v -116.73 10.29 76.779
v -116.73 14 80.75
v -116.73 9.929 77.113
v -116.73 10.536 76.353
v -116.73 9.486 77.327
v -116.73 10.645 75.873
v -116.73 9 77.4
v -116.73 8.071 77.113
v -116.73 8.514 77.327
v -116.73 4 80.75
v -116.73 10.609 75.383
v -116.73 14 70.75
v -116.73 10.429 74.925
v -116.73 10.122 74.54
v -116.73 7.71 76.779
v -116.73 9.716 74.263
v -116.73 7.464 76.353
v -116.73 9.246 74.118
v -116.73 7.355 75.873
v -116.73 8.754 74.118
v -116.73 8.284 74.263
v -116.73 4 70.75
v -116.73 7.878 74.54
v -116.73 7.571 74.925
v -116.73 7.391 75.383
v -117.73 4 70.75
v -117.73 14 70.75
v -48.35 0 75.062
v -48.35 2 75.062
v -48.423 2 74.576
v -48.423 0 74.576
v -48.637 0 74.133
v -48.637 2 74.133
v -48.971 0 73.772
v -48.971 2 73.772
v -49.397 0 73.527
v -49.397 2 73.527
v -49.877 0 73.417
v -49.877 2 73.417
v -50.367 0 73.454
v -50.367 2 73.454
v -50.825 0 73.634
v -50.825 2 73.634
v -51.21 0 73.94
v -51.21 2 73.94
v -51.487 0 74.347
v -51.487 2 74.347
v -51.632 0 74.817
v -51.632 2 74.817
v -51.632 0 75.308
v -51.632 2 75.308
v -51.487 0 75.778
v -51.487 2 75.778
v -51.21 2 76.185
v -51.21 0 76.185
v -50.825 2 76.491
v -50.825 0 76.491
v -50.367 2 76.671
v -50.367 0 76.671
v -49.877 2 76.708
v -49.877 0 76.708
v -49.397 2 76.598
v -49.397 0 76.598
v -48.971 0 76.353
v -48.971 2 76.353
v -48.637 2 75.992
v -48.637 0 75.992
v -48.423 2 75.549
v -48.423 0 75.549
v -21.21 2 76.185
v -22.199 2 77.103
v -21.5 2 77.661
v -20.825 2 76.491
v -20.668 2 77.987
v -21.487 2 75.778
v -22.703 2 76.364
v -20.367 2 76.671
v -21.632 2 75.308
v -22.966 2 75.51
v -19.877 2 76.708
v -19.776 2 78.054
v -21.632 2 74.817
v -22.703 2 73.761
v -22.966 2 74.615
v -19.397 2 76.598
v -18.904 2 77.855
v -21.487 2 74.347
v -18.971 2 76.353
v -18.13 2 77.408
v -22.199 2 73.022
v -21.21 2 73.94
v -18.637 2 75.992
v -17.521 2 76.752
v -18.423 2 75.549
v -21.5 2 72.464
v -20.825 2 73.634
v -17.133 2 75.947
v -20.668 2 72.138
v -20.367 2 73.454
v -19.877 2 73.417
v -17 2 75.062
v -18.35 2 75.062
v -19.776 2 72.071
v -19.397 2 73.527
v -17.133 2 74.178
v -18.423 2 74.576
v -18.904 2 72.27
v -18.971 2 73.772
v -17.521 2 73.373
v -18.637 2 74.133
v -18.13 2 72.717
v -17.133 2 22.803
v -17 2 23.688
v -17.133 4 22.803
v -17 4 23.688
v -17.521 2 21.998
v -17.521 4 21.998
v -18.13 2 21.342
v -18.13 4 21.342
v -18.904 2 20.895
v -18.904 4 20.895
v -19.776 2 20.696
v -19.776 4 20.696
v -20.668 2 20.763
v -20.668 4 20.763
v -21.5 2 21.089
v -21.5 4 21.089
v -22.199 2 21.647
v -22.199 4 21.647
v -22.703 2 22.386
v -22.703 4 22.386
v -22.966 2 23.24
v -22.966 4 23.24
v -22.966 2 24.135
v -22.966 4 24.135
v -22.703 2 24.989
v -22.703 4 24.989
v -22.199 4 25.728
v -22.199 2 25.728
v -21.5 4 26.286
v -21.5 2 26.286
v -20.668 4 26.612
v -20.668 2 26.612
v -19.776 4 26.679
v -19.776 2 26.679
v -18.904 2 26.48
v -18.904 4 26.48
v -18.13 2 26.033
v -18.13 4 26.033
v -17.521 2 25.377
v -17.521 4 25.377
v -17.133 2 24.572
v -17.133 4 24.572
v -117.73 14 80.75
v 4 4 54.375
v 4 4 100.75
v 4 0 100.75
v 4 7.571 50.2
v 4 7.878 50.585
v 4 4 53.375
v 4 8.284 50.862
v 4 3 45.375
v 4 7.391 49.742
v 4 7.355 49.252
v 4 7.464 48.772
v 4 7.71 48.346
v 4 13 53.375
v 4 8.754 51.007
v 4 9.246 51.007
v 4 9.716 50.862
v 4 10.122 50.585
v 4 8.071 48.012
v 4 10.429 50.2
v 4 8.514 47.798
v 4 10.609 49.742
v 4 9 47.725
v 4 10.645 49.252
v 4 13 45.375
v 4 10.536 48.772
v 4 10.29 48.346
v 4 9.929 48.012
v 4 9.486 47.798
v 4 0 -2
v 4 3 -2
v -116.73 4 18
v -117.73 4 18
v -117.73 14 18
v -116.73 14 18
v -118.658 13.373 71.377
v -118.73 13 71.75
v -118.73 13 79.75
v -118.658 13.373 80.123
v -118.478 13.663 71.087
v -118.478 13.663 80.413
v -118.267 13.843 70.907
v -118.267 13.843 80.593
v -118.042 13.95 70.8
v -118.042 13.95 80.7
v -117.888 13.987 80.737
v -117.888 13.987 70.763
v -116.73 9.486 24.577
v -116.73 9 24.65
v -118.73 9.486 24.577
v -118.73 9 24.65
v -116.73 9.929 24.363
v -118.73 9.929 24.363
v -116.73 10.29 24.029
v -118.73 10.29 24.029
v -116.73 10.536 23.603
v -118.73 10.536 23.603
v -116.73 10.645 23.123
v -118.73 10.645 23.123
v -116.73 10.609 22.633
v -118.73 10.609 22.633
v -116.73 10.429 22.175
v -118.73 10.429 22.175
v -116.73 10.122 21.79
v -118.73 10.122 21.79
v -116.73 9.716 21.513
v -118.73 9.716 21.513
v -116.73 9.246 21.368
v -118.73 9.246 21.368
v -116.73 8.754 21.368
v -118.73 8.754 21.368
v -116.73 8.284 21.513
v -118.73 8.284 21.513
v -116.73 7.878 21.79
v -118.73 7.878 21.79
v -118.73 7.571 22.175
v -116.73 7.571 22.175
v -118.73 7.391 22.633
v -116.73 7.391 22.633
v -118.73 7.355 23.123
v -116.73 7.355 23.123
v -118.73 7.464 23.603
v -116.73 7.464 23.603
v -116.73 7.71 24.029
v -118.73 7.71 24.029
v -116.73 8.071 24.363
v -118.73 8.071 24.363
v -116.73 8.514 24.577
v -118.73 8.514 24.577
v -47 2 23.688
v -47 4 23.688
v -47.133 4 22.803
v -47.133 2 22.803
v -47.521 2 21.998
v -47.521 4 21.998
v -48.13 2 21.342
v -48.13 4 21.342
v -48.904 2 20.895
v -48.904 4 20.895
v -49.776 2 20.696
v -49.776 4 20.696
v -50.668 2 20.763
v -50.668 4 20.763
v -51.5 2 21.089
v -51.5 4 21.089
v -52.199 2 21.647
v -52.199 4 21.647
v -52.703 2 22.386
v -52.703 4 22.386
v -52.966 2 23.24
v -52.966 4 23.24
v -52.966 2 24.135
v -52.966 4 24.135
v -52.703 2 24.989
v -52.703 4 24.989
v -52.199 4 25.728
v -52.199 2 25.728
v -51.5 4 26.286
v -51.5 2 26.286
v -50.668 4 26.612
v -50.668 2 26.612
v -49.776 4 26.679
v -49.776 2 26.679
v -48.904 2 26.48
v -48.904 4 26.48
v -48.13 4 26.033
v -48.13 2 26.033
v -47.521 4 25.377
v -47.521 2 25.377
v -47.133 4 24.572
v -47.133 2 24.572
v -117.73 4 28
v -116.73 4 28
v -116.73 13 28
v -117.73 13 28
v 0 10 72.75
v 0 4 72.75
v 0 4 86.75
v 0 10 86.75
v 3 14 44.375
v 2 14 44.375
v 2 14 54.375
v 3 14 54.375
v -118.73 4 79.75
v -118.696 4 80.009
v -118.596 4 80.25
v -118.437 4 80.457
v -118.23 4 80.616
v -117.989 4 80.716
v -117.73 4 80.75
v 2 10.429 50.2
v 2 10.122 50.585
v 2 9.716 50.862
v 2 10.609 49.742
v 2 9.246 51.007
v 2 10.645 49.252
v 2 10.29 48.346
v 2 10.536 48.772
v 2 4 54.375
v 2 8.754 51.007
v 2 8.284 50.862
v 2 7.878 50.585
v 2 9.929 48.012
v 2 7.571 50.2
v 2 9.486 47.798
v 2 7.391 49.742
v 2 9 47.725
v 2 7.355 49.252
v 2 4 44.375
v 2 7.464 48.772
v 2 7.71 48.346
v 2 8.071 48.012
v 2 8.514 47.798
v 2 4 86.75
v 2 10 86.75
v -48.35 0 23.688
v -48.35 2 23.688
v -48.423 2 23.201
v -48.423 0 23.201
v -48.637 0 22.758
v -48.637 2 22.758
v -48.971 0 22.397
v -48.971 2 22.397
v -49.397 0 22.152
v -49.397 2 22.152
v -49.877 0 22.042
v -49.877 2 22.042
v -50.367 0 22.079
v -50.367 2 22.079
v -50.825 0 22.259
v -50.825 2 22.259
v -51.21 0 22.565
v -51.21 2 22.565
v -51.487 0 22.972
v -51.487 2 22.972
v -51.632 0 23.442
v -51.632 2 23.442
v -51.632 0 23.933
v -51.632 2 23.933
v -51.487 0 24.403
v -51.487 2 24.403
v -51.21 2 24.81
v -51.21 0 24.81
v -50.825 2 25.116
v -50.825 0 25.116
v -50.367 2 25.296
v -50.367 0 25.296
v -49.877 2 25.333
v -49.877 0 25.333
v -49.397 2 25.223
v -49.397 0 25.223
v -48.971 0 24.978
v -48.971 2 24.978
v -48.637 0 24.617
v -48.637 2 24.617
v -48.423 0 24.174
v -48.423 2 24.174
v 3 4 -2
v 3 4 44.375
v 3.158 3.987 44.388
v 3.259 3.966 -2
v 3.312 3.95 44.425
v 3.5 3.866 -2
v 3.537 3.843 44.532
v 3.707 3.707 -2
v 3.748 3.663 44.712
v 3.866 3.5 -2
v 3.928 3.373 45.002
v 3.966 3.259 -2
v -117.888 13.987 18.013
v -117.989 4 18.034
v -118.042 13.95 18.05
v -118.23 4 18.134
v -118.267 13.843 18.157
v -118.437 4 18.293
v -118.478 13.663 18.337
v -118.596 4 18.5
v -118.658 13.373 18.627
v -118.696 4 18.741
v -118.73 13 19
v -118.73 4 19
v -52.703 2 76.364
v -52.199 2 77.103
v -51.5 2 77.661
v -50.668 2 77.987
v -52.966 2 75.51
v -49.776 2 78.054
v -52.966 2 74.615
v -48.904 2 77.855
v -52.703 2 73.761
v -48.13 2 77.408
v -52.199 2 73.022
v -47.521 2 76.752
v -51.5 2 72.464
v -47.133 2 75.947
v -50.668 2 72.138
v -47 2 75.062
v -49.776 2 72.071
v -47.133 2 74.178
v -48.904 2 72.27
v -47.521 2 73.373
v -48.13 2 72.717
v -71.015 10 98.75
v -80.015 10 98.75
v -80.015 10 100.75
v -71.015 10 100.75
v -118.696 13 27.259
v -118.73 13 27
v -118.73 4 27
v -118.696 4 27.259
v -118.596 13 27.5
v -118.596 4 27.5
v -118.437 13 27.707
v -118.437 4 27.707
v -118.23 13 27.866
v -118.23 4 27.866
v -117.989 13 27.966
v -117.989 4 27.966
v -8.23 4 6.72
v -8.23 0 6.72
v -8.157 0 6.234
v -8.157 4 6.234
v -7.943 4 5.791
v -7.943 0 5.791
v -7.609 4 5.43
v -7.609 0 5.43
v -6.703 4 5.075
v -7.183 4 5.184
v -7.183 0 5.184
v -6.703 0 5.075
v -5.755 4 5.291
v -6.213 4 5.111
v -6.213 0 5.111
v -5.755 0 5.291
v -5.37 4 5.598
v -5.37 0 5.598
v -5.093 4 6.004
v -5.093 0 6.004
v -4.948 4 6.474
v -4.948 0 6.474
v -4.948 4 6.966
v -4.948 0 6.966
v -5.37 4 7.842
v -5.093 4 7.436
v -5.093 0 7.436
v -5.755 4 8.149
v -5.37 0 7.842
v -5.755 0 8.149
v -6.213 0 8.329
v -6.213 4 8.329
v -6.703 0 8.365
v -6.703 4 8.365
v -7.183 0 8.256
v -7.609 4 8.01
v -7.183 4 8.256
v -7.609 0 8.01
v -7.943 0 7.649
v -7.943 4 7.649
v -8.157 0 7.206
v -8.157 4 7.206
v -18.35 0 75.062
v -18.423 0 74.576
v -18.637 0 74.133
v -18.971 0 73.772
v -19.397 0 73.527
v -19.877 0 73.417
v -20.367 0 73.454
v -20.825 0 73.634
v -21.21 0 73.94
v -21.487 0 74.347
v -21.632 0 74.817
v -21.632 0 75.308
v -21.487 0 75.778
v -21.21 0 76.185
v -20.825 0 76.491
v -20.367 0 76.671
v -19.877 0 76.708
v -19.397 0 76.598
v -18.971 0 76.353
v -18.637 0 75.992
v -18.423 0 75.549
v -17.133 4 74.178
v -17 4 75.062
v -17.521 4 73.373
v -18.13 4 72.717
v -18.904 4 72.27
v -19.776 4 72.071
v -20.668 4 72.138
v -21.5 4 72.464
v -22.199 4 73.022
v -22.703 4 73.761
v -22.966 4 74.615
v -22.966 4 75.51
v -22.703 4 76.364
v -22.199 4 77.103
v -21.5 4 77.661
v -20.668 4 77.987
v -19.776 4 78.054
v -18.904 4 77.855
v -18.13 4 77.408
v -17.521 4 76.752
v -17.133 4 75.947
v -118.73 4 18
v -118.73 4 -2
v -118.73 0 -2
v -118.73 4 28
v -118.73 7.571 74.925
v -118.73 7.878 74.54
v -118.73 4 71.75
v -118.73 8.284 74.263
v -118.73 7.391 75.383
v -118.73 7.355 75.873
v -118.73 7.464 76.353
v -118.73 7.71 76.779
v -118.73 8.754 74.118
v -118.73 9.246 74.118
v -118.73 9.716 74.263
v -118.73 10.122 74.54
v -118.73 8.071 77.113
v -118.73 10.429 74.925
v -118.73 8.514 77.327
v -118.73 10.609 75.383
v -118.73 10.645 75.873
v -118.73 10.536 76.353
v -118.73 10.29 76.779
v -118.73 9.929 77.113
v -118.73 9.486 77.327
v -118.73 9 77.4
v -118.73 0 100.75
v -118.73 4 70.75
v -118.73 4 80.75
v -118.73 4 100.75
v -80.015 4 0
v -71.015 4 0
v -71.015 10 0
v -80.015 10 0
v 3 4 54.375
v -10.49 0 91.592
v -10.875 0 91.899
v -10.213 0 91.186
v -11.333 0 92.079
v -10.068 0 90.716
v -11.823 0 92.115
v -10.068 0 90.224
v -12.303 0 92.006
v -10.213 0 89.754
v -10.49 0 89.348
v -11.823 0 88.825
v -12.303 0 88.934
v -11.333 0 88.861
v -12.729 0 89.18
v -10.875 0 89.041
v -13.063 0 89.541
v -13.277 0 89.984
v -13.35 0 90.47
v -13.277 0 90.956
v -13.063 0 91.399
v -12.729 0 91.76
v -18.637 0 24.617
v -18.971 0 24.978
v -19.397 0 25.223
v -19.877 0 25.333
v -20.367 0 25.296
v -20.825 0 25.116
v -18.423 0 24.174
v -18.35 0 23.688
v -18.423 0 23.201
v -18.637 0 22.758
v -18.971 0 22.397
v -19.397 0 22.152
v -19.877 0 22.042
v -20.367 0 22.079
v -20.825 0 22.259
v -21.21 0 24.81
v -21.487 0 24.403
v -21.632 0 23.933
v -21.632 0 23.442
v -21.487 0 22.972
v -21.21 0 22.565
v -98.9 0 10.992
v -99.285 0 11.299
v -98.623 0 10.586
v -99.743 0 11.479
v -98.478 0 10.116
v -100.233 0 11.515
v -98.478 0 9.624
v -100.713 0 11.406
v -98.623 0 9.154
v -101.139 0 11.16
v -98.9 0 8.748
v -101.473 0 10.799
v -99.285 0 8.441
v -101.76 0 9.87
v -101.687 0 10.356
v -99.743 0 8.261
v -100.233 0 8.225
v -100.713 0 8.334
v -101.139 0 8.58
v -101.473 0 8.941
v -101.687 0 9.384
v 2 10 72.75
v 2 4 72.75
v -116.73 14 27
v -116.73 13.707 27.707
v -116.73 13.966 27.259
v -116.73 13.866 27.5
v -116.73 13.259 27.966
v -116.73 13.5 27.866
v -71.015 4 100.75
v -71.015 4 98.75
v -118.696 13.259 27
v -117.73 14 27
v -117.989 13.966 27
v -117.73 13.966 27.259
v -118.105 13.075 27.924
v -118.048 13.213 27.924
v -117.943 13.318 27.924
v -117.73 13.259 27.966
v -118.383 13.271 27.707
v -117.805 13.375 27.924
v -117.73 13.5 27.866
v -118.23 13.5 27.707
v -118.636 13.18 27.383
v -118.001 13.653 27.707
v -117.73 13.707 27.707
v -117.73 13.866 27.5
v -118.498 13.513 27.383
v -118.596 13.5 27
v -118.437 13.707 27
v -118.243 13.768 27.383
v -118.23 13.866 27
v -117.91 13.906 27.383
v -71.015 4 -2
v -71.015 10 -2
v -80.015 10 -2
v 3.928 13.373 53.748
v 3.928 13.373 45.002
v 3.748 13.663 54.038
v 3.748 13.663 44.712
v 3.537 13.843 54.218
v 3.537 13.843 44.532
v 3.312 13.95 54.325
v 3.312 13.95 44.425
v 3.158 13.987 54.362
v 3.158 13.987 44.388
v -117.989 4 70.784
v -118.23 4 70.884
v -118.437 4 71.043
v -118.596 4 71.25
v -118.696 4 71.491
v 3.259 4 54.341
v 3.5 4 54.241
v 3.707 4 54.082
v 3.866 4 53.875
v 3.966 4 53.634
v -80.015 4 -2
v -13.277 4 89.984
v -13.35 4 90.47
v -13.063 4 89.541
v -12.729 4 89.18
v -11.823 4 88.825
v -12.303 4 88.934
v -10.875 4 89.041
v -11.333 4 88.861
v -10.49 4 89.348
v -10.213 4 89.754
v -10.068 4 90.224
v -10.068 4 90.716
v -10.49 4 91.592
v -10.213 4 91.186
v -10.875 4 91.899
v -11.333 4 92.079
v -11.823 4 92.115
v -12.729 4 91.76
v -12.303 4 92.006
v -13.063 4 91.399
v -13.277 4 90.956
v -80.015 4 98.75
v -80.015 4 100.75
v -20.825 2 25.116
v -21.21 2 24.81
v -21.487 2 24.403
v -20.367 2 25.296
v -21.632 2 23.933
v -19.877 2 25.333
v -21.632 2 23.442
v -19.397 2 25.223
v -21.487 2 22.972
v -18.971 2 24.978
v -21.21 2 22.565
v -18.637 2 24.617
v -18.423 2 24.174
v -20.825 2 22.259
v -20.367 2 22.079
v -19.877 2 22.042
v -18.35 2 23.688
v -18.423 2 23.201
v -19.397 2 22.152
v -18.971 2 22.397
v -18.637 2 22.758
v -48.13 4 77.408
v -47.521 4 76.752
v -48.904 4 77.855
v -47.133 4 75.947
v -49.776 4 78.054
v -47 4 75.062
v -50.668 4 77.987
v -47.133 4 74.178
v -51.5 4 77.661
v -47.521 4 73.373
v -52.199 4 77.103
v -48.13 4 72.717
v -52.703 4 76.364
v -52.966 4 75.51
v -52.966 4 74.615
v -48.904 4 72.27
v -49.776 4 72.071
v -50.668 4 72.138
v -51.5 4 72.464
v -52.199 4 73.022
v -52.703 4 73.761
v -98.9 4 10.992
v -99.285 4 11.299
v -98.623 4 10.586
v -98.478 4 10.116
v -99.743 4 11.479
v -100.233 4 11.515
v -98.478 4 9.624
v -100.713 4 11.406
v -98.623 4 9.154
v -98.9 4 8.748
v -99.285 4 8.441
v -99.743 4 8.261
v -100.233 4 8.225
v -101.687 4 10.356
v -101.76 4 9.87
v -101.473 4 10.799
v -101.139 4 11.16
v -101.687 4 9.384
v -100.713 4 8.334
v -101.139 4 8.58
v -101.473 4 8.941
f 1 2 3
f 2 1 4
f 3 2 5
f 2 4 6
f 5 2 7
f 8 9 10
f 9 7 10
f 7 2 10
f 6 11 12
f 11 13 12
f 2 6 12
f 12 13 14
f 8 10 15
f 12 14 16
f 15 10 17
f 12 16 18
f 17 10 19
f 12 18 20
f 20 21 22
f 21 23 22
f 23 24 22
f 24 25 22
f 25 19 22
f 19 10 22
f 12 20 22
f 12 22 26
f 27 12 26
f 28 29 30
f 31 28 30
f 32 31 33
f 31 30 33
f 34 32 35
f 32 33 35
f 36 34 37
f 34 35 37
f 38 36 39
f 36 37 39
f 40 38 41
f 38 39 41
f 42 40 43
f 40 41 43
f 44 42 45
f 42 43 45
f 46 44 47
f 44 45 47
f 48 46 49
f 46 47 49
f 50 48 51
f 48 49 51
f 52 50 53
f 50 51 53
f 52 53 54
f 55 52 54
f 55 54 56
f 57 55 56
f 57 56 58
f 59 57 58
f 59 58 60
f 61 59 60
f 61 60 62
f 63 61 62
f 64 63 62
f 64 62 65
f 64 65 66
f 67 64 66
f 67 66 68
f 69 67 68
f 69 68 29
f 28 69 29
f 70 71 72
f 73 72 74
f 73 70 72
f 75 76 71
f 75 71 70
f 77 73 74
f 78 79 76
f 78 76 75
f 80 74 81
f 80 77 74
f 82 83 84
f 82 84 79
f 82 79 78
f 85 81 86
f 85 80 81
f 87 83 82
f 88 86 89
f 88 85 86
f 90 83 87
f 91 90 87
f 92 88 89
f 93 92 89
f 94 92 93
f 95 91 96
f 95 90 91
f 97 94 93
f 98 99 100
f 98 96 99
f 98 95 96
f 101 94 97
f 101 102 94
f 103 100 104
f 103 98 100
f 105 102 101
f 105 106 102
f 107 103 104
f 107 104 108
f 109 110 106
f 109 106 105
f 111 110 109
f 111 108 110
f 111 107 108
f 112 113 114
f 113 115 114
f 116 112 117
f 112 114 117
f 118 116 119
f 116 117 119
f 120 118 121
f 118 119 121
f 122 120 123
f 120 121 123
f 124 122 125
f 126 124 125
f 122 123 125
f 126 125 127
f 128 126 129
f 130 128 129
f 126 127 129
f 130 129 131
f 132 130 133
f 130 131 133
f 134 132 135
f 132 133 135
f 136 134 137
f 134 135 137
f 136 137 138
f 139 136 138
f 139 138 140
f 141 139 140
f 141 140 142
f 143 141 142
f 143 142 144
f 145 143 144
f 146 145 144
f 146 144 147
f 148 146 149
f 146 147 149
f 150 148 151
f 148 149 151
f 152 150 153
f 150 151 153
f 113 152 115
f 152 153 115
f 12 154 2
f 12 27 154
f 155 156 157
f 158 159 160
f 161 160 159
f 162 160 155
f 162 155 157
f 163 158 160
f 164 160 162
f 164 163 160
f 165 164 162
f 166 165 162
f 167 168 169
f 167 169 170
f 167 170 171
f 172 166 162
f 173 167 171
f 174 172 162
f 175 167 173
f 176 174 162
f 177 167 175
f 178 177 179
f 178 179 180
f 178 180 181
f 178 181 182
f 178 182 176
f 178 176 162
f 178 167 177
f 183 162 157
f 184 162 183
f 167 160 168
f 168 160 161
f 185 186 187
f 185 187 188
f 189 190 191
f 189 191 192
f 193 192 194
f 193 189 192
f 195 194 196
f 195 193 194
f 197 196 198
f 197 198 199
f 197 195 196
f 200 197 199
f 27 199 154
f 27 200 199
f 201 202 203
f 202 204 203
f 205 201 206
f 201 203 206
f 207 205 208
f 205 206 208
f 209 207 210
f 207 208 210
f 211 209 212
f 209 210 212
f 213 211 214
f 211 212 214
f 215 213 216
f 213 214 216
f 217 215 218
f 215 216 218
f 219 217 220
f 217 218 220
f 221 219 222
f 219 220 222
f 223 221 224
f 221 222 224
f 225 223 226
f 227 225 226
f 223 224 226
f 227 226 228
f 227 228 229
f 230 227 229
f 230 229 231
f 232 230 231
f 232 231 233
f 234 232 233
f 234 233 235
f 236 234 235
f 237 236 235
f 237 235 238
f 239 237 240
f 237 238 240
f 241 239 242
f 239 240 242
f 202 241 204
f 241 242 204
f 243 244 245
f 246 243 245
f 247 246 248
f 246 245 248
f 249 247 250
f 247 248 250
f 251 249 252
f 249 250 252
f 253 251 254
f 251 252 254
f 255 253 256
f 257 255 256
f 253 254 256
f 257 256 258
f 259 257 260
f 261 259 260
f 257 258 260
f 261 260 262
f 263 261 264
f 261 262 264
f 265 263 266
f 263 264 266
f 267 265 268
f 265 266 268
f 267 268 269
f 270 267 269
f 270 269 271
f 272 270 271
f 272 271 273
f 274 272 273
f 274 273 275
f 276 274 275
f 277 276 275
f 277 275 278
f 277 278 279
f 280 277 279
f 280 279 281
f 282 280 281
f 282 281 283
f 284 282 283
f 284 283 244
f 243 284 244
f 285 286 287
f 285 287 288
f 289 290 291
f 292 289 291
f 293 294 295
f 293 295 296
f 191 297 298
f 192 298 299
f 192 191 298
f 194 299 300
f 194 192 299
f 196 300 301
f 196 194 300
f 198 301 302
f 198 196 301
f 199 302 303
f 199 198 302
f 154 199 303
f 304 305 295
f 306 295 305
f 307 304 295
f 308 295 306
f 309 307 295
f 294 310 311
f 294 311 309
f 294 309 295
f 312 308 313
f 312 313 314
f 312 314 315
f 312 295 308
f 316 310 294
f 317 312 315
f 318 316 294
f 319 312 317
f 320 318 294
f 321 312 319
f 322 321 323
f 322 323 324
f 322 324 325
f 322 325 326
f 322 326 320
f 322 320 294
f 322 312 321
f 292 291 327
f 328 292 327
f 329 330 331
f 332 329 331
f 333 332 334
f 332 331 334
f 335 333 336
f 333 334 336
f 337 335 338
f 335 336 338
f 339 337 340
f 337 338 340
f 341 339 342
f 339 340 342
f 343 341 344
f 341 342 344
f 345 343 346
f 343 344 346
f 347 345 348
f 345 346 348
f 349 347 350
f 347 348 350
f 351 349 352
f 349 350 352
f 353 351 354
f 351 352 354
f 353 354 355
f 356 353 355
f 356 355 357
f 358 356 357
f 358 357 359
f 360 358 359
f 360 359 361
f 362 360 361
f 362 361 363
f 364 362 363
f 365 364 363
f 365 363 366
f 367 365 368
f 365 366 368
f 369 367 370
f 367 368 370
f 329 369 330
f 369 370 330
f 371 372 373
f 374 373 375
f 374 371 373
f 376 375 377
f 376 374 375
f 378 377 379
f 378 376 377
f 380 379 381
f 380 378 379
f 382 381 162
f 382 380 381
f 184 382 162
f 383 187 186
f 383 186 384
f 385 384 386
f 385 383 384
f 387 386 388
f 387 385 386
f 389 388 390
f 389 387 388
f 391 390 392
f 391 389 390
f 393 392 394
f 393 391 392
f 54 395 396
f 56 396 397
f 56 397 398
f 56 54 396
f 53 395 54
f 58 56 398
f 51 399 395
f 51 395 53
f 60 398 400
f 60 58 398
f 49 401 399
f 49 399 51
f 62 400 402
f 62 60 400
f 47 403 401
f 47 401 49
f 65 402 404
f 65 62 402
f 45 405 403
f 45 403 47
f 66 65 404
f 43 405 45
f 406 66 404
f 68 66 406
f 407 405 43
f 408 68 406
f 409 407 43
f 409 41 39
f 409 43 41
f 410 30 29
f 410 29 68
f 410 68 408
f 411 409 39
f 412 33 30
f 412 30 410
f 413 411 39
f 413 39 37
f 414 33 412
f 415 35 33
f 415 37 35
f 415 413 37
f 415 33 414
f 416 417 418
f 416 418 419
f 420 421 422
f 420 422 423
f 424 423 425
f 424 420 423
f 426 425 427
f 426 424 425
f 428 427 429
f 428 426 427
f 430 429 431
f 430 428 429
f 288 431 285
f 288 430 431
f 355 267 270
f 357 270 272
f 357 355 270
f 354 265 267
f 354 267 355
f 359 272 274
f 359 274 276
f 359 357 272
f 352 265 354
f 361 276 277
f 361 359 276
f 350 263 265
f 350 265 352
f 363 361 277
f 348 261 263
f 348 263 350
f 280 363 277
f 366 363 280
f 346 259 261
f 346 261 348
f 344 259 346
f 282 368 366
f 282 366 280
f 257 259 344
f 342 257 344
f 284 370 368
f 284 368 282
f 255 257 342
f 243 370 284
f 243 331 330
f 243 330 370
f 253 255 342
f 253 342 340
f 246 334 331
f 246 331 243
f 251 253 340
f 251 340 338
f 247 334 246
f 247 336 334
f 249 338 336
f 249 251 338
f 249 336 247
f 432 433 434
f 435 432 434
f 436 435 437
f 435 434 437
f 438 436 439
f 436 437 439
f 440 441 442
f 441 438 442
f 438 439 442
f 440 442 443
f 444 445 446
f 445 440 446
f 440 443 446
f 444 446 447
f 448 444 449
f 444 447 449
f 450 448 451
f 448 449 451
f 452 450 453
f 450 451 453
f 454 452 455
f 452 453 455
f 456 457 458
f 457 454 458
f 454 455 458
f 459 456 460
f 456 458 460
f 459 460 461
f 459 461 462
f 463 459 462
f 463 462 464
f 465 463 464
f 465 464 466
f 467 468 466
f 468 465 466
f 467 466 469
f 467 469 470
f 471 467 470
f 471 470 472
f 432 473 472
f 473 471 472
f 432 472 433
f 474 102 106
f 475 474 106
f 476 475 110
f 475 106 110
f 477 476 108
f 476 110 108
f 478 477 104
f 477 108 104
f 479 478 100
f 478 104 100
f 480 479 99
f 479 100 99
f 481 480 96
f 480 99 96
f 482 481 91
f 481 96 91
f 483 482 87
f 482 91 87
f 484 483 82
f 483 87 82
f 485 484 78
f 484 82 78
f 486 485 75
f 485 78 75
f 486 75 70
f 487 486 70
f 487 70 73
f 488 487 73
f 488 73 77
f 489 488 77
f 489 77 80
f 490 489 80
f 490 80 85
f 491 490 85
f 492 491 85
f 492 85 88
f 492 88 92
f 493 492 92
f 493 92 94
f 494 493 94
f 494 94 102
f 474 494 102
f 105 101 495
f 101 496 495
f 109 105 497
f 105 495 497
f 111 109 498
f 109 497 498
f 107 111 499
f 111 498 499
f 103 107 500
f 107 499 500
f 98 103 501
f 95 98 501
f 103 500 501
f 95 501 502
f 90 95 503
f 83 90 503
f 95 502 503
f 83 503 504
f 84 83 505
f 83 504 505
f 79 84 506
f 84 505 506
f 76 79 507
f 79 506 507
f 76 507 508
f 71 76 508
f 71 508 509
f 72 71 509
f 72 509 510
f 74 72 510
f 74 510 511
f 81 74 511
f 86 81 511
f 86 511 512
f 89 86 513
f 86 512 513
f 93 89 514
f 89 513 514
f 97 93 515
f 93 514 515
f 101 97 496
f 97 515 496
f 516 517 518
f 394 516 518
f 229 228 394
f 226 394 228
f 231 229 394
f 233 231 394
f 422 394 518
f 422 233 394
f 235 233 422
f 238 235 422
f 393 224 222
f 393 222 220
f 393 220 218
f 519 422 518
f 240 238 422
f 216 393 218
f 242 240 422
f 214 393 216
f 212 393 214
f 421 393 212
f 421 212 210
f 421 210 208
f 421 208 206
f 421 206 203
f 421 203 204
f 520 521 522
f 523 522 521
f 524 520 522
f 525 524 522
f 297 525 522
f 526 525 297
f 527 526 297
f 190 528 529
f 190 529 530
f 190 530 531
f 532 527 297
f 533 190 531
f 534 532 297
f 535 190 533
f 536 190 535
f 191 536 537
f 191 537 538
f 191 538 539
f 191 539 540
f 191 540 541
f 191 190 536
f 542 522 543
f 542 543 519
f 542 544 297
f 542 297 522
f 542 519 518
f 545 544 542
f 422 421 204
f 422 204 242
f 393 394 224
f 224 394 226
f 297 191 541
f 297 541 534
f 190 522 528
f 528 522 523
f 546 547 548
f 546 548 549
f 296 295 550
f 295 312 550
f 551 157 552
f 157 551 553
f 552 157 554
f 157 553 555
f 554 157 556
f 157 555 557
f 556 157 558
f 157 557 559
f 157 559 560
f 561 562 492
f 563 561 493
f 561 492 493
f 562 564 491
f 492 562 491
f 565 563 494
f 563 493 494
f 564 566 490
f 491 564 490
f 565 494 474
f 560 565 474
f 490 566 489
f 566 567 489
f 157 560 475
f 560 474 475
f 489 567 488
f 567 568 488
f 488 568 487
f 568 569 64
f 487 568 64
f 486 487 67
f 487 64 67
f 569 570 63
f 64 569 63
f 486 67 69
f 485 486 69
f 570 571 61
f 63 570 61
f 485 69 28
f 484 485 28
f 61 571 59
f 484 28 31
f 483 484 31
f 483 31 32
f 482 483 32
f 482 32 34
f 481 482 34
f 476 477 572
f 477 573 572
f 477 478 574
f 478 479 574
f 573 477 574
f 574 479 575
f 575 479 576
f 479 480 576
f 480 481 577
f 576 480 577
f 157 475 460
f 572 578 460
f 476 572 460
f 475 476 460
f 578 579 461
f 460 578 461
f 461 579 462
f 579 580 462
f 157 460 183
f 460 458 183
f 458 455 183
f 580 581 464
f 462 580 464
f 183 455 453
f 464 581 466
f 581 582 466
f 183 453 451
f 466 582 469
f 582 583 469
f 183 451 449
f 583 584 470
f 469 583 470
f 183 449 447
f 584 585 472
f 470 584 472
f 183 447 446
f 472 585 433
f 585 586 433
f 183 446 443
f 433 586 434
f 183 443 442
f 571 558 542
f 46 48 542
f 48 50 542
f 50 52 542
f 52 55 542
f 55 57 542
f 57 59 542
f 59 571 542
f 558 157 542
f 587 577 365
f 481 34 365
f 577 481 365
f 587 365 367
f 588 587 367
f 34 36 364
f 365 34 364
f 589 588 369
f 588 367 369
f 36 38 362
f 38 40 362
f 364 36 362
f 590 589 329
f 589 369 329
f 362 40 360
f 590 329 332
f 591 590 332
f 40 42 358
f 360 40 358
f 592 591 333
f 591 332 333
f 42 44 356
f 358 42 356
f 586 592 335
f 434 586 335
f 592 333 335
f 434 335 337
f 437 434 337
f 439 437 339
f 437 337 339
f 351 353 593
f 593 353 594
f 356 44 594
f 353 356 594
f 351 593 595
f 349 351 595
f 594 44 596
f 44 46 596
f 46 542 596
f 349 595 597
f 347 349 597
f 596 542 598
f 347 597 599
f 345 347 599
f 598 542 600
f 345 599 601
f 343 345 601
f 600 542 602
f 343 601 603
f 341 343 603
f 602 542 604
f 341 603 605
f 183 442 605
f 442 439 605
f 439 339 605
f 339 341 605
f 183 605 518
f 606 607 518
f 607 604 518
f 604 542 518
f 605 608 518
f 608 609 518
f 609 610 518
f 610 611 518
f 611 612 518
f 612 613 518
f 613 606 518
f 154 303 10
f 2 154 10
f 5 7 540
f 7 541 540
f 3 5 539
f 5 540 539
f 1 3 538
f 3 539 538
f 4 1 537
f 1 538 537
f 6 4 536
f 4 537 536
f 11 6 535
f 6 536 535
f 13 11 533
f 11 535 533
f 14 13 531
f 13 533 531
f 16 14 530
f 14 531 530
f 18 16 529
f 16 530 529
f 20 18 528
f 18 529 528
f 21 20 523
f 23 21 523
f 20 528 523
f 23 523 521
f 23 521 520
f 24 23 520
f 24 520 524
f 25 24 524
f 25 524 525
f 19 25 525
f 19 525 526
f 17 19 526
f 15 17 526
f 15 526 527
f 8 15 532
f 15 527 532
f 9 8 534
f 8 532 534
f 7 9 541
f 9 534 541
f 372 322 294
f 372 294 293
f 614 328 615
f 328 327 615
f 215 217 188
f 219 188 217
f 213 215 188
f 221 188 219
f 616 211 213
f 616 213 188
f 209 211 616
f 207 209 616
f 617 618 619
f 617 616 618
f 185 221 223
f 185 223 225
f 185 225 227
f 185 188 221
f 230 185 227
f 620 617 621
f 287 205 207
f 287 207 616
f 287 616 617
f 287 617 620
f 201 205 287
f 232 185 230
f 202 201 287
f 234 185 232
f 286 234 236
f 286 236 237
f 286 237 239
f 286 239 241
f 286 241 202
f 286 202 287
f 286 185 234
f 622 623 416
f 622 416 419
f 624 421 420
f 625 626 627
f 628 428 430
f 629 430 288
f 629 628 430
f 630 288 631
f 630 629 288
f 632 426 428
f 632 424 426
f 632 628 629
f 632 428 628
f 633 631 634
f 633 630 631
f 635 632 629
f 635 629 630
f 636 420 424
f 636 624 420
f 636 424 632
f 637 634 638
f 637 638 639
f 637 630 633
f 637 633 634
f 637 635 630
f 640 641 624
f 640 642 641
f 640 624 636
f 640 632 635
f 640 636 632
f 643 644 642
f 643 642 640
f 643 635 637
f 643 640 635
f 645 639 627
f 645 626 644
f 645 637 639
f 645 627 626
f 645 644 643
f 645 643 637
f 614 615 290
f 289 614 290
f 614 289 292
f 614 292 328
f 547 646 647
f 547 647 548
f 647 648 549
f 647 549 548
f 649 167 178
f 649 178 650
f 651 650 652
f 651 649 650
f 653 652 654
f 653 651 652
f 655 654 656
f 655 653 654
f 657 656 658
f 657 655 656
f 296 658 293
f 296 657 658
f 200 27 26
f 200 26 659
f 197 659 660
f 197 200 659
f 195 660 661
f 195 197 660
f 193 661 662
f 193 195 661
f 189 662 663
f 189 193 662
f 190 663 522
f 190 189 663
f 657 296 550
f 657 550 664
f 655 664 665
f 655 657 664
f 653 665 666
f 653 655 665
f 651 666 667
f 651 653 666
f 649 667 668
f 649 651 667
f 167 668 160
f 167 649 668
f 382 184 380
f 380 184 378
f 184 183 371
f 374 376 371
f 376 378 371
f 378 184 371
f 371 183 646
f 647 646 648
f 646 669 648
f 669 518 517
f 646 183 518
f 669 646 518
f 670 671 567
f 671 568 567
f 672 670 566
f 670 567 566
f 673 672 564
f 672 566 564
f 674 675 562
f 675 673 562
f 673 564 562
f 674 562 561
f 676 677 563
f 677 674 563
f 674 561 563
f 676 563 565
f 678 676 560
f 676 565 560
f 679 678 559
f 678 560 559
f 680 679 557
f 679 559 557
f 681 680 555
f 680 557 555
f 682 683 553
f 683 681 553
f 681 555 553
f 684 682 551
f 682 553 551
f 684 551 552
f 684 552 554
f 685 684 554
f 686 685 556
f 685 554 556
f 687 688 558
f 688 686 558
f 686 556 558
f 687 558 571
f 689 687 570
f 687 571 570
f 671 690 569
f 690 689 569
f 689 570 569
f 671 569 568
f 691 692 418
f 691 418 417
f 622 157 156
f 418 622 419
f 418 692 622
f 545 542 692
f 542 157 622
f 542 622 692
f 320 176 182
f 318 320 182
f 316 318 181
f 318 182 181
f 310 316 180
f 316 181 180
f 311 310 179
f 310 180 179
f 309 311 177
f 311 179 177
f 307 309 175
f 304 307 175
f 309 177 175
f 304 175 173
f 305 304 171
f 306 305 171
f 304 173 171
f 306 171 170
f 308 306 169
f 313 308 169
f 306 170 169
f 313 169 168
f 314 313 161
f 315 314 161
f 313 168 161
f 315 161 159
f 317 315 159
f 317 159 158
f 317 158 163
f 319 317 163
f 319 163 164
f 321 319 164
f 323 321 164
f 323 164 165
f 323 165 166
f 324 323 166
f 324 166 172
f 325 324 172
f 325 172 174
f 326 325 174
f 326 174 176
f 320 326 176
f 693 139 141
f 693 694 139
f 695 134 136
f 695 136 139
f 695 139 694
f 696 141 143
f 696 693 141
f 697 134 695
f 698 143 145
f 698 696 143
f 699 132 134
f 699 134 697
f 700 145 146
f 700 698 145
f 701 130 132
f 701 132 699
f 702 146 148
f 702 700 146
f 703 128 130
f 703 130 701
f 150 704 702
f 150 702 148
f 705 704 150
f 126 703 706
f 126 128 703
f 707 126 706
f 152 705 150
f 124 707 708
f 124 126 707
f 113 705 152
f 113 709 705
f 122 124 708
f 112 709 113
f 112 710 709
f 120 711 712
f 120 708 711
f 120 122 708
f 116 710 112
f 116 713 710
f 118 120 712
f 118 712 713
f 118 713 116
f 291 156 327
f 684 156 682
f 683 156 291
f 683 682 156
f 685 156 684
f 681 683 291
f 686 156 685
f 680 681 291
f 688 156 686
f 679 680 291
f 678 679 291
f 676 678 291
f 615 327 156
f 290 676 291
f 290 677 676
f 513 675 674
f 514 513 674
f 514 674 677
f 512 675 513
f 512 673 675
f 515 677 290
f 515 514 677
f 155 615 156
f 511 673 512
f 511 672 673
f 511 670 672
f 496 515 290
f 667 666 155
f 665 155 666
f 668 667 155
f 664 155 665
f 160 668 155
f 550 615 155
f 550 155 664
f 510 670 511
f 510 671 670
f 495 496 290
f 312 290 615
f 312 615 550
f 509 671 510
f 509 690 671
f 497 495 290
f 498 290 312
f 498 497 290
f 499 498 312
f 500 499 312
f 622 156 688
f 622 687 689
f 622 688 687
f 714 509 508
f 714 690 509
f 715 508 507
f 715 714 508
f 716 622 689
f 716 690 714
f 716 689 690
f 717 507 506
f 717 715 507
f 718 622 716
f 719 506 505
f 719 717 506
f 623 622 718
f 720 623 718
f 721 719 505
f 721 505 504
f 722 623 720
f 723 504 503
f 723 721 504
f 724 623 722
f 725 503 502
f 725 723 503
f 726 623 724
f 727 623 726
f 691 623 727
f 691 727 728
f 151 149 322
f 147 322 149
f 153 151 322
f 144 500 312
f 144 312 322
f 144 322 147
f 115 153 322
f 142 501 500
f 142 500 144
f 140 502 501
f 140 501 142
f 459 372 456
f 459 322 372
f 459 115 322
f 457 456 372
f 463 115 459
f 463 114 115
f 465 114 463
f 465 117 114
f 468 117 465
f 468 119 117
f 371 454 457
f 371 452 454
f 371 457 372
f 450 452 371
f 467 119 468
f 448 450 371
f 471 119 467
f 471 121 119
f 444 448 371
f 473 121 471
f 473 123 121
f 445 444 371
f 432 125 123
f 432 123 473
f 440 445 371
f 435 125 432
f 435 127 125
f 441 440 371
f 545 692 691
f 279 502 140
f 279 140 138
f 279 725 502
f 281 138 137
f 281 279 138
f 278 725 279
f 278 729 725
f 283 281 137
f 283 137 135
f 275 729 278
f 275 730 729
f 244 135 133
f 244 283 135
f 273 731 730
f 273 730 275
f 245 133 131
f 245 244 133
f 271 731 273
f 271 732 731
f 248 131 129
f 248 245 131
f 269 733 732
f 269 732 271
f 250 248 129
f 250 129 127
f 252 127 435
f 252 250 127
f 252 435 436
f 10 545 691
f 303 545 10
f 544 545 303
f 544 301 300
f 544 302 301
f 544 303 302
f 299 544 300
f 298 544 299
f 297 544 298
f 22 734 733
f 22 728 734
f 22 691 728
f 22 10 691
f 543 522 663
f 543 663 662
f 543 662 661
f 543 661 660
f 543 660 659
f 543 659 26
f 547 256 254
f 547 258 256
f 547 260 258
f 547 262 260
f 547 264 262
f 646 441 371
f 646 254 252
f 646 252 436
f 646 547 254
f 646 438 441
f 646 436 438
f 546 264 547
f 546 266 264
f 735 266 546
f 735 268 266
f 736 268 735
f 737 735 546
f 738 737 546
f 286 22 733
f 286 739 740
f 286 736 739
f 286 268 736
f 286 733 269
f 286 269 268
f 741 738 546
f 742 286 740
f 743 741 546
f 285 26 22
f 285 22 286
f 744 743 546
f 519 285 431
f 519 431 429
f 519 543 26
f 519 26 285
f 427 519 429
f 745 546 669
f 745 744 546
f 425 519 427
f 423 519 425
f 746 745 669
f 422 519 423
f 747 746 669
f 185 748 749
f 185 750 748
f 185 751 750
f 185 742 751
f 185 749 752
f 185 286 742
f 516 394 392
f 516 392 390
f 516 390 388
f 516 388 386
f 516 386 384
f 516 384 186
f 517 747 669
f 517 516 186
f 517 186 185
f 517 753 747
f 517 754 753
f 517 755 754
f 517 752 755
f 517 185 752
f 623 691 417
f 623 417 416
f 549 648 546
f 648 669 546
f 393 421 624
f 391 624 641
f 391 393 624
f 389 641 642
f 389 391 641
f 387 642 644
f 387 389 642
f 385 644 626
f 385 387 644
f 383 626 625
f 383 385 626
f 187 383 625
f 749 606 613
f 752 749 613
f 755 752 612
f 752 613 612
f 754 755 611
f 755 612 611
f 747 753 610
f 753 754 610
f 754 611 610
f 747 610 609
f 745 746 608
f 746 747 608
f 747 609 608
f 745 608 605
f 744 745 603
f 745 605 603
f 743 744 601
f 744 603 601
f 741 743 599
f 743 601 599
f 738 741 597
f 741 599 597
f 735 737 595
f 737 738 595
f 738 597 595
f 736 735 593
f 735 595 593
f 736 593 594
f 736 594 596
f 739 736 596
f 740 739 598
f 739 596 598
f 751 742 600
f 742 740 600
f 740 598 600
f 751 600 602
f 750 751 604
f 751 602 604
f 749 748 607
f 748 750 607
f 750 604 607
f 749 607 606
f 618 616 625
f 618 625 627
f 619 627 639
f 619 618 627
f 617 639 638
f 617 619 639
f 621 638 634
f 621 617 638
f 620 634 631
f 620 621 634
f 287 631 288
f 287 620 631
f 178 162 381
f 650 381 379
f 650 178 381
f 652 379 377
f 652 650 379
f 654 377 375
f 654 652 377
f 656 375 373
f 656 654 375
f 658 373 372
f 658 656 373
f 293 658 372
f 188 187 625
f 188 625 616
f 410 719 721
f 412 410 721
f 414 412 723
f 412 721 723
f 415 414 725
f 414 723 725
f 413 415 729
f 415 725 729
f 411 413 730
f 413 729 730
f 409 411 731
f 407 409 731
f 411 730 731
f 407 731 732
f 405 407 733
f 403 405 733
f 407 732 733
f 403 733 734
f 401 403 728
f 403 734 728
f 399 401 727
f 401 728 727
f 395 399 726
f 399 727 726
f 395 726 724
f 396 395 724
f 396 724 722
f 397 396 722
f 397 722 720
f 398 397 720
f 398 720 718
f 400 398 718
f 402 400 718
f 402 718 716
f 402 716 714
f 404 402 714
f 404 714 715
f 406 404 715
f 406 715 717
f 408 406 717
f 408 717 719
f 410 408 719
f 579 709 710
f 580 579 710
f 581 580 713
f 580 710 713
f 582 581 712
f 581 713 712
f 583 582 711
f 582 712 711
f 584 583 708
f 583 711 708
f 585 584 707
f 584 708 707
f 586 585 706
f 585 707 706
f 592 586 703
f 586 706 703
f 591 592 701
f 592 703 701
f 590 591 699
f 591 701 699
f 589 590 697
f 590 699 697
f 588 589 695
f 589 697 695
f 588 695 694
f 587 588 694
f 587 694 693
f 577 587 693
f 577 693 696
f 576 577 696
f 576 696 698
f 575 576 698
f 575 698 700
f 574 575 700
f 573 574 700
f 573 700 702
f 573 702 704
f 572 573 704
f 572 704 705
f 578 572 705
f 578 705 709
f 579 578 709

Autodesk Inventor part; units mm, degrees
ref_plane "YZ Plane" through (0, 0, 0) normal (1, 0, 0) x (0, 1, 0)
ref_plane "XZ Plane" through (0, 0, 0) normal (0, 1, 0) x (-1, 0, 0)
ref_plane "XY Plane" through (0, 0, 0) normal (0, 0, 1) x (1, 0, 0)
sketch "Sketch1" plane through (0, 0, 0) normal (0, 1, 0) x (-1, 0, 0)
  line L0 (0, 0) -> (0, 98.75)
  line L1 (0, 98.75) -> (114.73, 98.75)
  line L2 (114.73, 98.75) -> (114.73, 0)
  line L3 (114.73, 0) -> (0, 0)
  line L4 (0, 98.75) -> (0, 90.47)
  circle A0 centre (11.7, 90.47) radius 1.65
  line L5 (0, 0) -> (0, 6.72)
  circle A1 centre (6.58, 6.72) radius 1.65
  line L6 (114.73, 0) -> (114.73, 9.87)
  circle A2 centre (100.11, 9.87) radius 1.65
  line L7 (-2, 0) -> (-2, 98.75)
  line L8 (-2, 98.75) -> (-2, 100.75)
  line L9 (-2, 100.75) -> (114.73, 100.75)
  line L10 (114.73, 100.75) -> (116.73, 100.75)
  line L11 (116.73, 100.75) -> (116.73, 0)
  line L12 (116.73, 0) -> (116.73, -2)
  line L13 (116.73, -2) -> (-2, -2)
  line L14 (-2, -2) -> (-2, 0)
  dimension "d11" = 2
  dimension "d12" = 2
  dimension "d13" = 2
  dimension "d14" = 2
extrude "Extrusion1" add sketch "Sketch1" along normal blind 4 contours L0 L1 L2 L3 | L7 L8 L9 L10 L11 L12 L13 L14
sketch "Sketch9" plane through (0, 4, 0) normal (0, 1, 0) x (1, 0, 0)
  circle A0 centre (-50, -75.0625) radius 1.65
  circle A1 centre (-20, -75.0625) radius 1.65
  circle A2 centre (-50, -23.6875) radius 1.65
  circle A3 centre (-20, -23.6875) radius 1.65
  point P0 (2, 2)
  dimension "d51" = 3.3
  dimension "d52" = 3.3
  dimension "d54" = 3.3
  dimension "d55" = 3.3
extrude "Extrusion9" cut sketch "Sketch9" against normal blind 10
sketch "Sketch10" plane through (0, 4, 0) normal (0, 1, 0) x (1, 0, 0)
  circle A0 centre (-50, -75.0625) radius 1.65 projected
  circle A1 centre (-50, -75.0625) radius 3
  circle A2 centre (-50, -23.6875) radius 1.65 projected
  circle A3 centre (-50, -23.6875) radius 3
  circle A4 centre (-20, -23.6875) radius 1.65 projected
  circle A5 centre (-20, -23.6875) radius 3
  circle A6 centre (-20, -75.0625) radius 1.65 projected
  circle A7 centre (-20, -75.0625) radius 3
  point P0 (0, 0)
  dimension "d58" = 6
  dimension "d59" = 6
  dimension "d60" = 6
  dimension "d61" = 6
extrude "Extrusion10" cut sketch "Sketch10" against normal blind 2
sketch "Sketch11" plane through (-116.73, 0, -2) normal (-1, 0, 0) x (0, 0, 1)
  line L0 (0, 0) -> (102.75, 0) projected
  line L1 (102.75, 4) -> (0, 4) projected
  line L2 (102.75, 0) -> (102.75, 4)
  line L3 (102.75, 4) -> (0, 4)
  line L4 (0, 0) -> (0, 4) projected
  line L5 (0, 4) -> (0, 0)
  line L6 (0, 0) -> (102.75, 0)
  point P0 (2, 0)
extrude "Extrusion11" add sketch "Sketch11" along normal blind 2
sketch "Sketch12" plane through (0, 4, 0) normal (0, 1, 0) x (1, 0, 0)
  line L0 (-118.73, -100.75) -> (-118.73, 2) projected
  line L1 (-118.73, -100.75) -> (-118.73, -80.75)
  line L2 (-118.73, -80.75) -> (-116.73, -80.75)
  line L3 (-116.73, -80.75) -> (-116.73, -70.75)
  line L4 (-116.73, -70.75) -> (-118.73, -70.75)
  line L5 (-118.73, -80.75) -> (-118.73, -70.75)
  line L6 (-118.73, 2) -> (-118.73, -18)
  line L7 (-118.73, -18) -> (-116.73, -18)
  line L8 (-116.73, -18) -> (-116.73, -28)
  line L9 (-116.73, -28) -> (-118.73, -28)
  line L10 (-118.73, -18) -> (-118.73, -28)
  point P0 (0, 0)
  dimension "d66" = 20
  dimension "d67" = 2
  dimension "d68" = 10
  dimension "d69" = 20
  dimension "d70" = 2
  dimension "d71" = 10
extrude "Extrusion12" add sketch "Sketch12" along normal blind 10
sketch "Sketch13" plane through (-118.73, 0, -2) normal (-1, 0, 0) x (0, 0, 1)
  line L0 (20, 14) -> (30, 14) projected
  line L1 (25, 14) -> (25, 9)
  line L2 (82.75, 14) -> (72.75, 14) projected
  line L3 (77.75, 14) -> (77.75, 9)
  circle A0 centre (25, 9) radius 1.65
  circle A1 centre (77.75, 9) radius 1.65
  point P0 (2, 0)
  dimension "d74" = 5
  dimension "d77" = 3.3
  dimension "d78" = 3.3
sketch "Sketch14" plane through (2, 0, 100.75) normal (1, 0, 0) x (0, 0, -1)
  line L0 (0, 4) -> (102.75, 4) projected
  line L1 (0, 0) -> (0, 4) projected
  line L2 (0, 4) -> (0, 0)
  line L3 (102.75, 0) -> (102.75, 4) projected
  line L4 (0, 0) -> (102.75, 0)
  line L5 (102.75, 0) -> (102.75, 4)
  line L6 (102.75, 4) -> (0, 4)
  point P0 (100.75, 0)
extrude "Extrusion13" add sketch "Sketch14" along normal blind 2
sketch "Sketch15" plane through (0, 4, 0) normal (0, 1, 0) x (1, 0, 0)
  line L0 (4, 2) -> (4, -100.75) projected
  line L1 (2, -49.375) -> (2, -44.375)
  line L2 (2, -44.375) -> (4, -44.375)
  line L3 (2, -49.375) -> (2, -54.375)
  line L4 (2, -54.375) -> (4, -54.375)
  line L5 (4, -44.375) -> (4, -44.7728)
  line L6 (4, -54.375) -> (4, -44.375)
  point P0 (0, 0)
  dimension "d82" = 5
  dimension "d83" = 5
extrude "Extrusion14" add sketch "Sketch15" along normal blind 10
sketch "Sketch16" plane through (4, 0, 100.75) normal (1, 0, 0) x (0, 0, -1)
  line L0 (56.375, 14) -> (46.375, 14) projected
  line L1 (51.375, 14) -> (51.375, 9)
  circle A0 centre (51.375, 9) radius 1.65
  point P0 (100.75, 0)
  dimension "d86" = 5
  dimension "d87" = 3.3
extrude "Extrusion15" cut sketch "Sketch16" against normal blind 10
extrude "Extrusion16" cut sketch "Sketch13" against normal blind 10
sketch "Sketch17" plane through (0, 4, 0) normal (0, 1, 0) x (1, 0, 0)
  line L0 (-71.73, 2) -> (-71.015, 2)
  line L1 (-71.015, 2) -> (-71.015, 0)
  line L2 (-71.015, 0) -> (-80.015, 0)
  line L3 (-80.015, 2) -> (-80.015, 0)
  line L4 (-80.015, 2) -> (-71.73, 2)
  line L5 (-118.73, 2) -> (4, 2) projected
  line L6 (-80.015, -100.75) -> (-80.015, -98.75)
  line L7 (-71.73, -98.75) -> (-71.015, -98.75)
  line L8 (-71.015, -98.75) -> (-71.015, -100.75)
  line L9 (-71.015, -100.75) -> (-80.015, -100.75)
  line L10 (-80.015, -98.75) -> (-71.73, -98.75)
  point P0 (0, 0)
  point P1 (-118.73, -100.75)
  dimension "d107" = 0.715
  dimension "d109" = 0.715
extrude "Extrusion17" add sketch "Sketch17" along normal blind 6
sketch "Sketch18" plane through (0, 4, 0) normal (0, 1, 0) x (1, 0, 0)
  line L0 (4, -54.375) -> (4, -100.75) projected
  line L1 (4, -100.75) -> (4, -86.75)
  line L2 (4, -86.75) -> (4, -72.75)
  line L3 (4, -72.75) -> (0, -72.75)
  line L4 (0, -72.75) -> (0, -86.75)
  line L5 (0, -86.75) -> (2, -86.75)
  line L6 (2, -86.75) -> (2, -72.75)
  point P0 (0, 0)
  dimension "d100" = 14
  dimension "d101" = 14
  dimension "d102" = 4
  dimension "d103" = 2
extrude "Extrusion18" add sketch "Sketch18" along normal blind 6
fillet "Fillet1" radius 1 9 edges at (4, 14, 49.375) (4, 9, 44.375) (4, 9, 54.375) (4, 4, 21.1875) (-118.73, 9, 80.75) (-118.73, 14, 75.75) (-118.73, 9, 70.75) (-118.73, 14, 23) (-118.73, 9, 18)
fillet "Fillet2" radius 1 2 edges at (-118.4371, 13.7071, 28) (-118.73, 8.5, 28)
properties part number "case"
